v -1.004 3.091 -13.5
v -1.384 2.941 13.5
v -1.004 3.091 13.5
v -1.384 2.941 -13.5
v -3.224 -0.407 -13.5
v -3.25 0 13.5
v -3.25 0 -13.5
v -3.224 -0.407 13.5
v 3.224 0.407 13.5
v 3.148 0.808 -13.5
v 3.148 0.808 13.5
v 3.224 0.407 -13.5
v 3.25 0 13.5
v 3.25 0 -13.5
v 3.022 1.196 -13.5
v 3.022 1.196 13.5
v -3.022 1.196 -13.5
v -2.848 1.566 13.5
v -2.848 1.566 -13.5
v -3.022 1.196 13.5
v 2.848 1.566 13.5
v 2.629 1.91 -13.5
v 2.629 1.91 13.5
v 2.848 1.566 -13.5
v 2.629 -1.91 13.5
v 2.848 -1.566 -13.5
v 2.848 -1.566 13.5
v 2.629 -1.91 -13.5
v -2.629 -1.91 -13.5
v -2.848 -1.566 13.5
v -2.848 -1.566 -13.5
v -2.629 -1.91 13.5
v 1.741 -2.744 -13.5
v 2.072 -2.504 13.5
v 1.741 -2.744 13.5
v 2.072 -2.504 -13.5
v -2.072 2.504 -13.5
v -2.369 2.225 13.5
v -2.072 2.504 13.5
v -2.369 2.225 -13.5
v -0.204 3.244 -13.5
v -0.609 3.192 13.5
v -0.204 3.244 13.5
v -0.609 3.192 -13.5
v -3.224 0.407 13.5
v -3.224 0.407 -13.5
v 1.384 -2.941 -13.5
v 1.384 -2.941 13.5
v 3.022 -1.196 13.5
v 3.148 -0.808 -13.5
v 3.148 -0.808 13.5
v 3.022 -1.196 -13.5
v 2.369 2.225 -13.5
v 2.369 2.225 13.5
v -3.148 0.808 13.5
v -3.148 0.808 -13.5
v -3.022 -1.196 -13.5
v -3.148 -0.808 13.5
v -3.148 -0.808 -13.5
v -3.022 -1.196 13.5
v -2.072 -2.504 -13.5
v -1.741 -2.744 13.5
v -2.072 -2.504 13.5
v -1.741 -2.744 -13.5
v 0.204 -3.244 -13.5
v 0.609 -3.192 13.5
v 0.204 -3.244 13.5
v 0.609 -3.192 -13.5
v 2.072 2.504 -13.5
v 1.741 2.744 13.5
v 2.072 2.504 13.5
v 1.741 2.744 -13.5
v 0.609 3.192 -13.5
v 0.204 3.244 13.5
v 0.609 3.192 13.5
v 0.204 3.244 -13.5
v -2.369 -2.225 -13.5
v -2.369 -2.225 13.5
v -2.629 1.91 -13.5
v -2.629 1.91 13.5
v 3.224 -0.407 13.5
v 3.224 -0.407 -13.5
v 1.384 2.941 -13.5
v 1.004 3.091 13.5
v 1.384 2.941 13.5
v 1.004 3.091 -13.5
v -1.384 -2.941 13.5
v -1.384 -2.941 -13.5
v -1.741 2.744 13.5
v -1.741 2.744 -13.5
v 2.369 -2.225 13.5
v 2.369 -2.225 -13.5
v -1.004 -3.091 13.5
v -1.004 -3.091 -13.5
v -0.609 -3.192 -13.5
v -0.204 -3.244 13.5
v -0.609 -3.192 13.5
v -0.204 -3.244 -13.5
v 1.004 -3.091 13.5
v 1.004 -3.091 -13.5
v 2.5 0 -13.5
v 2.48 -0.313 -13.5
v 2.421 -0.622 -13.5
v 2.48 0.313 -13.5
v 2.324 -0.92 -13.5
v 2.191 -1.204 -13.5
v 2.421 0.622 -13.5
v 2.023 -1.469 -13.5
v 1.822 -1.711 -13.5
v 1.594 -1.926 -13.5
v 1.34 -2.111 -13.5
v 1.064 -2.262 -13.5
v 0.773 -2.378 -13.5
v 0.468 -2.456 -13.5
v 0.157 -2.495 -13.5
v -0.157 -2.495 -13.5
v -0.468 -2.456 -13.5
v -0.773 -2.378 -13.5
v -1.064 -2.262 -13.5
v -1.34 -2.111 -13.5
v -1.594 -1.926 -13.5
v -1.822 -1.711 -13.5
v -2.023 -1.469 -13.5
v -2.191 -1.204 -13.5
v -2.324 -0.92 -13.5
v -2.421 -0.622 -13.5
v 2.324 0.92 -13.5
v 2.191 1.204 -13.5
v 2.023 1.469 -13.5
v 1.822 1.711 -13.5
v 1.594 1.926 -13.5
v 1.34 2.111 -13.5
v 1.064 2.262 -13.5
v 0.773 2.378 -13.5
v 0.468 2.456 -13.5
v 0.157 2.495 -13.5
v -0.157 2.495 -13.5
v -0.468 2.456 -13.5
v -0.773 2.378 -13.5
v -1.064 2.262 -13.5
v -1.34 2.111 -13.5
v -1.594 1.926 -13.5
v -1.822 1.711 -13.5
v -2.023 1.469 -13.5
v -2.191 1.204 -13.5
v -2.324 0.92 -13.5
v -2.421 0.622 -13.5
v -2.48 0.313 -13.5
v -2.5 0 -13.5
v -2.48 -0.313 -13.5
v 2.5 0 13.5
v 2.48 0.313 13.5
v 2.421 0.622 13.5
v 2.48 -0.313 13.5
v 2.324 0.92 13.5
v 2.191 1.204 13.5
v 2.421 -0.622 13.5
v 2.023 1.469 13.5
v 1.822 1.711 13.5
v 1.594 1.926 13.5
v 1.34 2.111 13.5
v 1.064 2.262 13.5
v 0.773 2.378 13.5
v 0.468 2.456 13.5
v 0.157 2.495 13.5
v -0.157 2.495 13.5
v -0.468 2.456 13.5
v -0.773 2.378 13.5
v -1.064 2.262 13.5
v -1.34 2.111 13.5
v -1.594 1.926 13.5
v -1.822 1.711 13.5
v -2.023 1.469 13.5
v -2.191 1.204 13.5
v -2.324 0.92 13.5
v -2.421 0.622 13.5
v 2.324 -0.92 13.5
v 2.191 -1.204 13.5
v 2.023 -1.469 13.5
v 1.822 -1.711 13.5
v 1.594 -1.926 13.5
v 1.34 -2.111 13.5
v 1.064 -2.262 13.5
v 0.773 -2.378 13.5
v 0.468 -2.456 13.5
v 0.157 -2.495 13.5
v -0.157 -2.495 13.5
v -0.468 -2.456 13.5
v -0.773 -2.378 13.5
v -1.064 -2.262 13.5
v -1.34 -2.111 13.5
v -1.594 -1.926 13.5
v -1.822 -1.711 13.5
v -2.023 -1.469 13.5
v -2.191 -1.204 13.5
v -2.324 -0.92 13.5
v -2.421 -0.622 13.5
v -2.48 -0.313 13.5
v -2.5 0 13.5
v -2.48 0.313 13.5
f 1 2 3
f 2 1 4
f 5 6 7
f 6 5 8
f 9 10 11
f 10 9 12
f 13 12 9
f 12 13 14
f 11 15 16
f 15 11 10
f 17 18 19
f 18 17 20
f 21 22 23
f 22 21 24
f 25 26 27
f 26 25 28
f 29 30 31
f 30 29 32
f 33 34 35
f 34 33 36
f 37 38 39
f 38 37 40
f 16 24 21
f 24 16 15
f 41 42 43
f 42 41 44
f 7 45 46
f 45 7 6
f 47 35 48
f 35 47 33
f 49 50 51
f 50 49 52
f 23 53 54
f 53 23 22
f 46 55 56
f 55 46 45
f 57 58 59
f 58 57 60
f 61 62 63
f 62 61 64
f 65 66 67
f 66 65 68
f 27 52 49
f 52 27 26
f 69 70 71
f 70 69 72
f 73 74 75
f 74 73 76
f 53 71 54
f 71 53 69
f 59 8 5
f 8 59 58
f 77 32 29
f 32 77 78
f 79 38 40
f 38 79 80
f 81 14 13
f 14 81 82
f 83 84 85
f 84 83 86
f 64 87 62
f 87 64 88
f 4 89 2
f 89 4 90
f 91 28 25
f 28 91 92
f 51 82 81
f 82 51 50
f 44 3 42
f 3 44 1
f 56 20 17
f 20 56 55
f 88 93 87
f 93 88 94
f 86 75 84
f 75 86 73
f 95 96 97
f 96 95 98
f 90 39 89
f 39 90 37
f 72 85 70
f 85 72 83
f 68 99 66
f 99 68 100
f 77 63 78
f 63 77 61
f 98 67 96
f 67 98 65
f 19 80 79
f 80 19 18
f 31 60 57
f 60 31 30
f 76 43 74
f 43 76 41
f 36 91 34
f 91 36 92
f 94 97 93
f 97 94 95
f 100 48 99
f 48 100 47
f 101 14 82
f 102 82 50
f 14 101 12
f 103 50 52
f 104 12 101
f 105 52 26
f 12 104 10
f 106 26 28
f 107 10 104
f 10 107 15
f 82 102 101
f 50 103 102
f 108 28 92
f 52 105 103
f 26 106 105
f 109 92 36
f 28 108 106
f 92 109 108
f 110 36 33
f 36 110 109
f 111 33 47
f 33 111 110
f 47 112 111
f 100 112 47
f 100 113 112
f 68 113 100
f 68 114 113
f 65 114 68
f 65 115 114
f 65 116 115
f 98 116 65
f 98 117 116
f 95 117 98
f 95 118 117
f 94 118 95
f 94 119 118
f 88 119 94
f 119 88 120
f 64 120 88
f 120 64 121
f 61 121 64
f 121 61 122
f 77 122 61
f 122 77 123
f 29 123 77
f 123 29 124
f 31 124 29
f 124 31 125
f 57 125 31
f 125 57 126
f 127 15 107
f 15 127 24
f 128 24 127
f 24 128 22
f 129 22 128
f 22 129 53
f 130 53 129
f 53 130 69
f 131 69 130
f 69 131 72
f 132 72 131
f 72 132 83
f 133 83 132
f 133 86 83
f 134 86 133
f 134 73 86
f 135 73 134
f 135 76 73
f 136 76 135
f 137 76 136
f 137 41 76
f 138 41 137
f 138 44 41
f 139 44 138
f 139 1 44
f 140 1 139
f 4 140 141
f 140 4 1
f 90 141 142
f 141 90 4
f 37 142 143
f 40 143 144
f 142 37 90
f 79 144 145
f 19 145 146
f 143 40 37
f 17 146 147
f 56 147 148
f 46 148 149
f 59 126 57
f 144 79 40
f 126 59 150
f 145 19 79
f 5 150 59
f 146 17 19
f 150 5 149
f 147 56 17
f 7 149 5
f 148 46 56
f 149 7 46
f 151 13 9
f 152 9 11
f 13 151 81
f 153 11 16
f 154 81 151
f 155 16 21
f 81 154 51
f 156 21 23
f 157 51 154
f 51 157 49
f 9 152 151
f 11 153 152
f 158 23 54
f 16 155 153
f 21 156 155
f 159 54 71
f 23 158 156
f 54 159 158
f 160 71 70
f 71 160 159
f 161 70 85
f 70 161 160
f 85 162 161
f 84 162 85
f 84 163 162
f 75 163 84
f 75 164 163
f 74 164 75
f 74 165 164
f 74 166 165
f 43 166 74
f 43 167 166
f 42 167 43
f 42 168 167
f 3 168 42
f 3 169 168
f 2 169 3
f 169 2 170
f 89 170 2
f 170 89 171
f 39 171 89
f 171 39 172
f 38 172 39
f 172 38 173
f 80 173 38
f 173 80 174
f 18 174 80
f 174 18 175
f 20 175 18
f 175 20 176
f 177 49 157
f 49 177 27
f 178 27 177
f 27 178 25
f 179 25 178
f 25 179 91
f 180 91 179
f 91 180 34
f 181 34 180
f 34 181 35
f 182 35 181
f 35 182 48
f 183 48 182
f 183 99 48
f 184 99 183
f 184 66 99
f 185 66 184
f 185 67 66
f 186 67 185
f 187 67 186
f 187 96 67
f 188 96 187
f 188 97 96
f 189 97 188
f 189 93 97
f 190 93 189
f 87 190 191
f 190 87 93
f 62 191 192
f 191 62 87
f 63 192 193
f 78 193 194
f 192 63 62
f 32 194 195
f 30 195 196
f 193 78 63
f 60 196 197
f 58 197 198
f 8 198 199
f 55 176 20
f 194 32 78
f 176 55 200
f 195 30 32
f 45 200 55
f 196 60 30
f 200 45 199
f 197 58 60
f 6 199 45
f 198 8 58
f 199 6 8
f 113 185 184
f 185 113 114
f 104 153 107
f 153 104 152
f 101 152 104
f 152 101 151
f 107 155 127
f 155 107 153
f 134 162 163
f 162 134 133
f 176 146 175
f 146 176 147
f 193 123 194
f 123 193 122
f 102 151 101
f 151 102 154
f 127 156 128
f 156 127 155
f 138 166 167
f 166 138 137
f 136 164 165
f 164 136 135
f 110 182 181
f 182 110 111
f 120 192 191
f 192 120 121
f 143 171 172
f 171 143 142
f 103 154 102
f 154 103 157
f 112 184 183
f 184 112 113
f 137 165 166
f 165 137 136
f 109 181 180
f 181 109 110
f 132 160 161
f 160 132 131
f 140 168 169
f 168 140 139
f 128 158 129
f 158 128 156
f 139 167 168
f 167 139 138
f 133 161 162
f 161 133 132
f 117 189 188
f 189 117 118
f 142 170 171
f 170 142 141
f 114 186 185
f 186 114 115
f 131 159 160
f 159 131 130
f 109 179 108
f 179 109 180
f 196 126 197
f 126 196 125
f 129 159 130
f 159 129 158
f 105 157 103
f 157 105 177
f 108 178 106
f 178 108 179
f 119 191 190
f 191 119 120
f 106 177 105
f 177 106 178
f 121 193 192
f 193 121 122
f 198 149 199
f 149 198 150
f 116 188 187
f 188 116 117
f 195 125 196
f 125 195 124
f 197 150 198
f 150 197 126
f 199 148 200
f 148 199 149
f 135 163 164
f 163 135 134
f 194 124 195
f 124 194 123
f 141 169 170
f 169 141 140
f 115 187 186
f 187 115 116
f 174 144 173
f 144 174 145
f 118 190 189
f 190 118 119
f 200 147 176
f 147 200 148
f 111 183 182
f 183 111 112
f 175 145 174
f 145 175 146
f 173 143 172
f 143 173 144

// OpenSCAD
$fn = 50;


difference() {
	union() {
		translate(v = [0, 0, -13.5000000000]) {
			cylinder(h = 27, r = 3.2500000000);
		}
	}
	union() {
		translate(v = [0, 0, -100.0000000000]) {
			cylinder(h = 200, r = 2.5000000000);
		}
	}
}
